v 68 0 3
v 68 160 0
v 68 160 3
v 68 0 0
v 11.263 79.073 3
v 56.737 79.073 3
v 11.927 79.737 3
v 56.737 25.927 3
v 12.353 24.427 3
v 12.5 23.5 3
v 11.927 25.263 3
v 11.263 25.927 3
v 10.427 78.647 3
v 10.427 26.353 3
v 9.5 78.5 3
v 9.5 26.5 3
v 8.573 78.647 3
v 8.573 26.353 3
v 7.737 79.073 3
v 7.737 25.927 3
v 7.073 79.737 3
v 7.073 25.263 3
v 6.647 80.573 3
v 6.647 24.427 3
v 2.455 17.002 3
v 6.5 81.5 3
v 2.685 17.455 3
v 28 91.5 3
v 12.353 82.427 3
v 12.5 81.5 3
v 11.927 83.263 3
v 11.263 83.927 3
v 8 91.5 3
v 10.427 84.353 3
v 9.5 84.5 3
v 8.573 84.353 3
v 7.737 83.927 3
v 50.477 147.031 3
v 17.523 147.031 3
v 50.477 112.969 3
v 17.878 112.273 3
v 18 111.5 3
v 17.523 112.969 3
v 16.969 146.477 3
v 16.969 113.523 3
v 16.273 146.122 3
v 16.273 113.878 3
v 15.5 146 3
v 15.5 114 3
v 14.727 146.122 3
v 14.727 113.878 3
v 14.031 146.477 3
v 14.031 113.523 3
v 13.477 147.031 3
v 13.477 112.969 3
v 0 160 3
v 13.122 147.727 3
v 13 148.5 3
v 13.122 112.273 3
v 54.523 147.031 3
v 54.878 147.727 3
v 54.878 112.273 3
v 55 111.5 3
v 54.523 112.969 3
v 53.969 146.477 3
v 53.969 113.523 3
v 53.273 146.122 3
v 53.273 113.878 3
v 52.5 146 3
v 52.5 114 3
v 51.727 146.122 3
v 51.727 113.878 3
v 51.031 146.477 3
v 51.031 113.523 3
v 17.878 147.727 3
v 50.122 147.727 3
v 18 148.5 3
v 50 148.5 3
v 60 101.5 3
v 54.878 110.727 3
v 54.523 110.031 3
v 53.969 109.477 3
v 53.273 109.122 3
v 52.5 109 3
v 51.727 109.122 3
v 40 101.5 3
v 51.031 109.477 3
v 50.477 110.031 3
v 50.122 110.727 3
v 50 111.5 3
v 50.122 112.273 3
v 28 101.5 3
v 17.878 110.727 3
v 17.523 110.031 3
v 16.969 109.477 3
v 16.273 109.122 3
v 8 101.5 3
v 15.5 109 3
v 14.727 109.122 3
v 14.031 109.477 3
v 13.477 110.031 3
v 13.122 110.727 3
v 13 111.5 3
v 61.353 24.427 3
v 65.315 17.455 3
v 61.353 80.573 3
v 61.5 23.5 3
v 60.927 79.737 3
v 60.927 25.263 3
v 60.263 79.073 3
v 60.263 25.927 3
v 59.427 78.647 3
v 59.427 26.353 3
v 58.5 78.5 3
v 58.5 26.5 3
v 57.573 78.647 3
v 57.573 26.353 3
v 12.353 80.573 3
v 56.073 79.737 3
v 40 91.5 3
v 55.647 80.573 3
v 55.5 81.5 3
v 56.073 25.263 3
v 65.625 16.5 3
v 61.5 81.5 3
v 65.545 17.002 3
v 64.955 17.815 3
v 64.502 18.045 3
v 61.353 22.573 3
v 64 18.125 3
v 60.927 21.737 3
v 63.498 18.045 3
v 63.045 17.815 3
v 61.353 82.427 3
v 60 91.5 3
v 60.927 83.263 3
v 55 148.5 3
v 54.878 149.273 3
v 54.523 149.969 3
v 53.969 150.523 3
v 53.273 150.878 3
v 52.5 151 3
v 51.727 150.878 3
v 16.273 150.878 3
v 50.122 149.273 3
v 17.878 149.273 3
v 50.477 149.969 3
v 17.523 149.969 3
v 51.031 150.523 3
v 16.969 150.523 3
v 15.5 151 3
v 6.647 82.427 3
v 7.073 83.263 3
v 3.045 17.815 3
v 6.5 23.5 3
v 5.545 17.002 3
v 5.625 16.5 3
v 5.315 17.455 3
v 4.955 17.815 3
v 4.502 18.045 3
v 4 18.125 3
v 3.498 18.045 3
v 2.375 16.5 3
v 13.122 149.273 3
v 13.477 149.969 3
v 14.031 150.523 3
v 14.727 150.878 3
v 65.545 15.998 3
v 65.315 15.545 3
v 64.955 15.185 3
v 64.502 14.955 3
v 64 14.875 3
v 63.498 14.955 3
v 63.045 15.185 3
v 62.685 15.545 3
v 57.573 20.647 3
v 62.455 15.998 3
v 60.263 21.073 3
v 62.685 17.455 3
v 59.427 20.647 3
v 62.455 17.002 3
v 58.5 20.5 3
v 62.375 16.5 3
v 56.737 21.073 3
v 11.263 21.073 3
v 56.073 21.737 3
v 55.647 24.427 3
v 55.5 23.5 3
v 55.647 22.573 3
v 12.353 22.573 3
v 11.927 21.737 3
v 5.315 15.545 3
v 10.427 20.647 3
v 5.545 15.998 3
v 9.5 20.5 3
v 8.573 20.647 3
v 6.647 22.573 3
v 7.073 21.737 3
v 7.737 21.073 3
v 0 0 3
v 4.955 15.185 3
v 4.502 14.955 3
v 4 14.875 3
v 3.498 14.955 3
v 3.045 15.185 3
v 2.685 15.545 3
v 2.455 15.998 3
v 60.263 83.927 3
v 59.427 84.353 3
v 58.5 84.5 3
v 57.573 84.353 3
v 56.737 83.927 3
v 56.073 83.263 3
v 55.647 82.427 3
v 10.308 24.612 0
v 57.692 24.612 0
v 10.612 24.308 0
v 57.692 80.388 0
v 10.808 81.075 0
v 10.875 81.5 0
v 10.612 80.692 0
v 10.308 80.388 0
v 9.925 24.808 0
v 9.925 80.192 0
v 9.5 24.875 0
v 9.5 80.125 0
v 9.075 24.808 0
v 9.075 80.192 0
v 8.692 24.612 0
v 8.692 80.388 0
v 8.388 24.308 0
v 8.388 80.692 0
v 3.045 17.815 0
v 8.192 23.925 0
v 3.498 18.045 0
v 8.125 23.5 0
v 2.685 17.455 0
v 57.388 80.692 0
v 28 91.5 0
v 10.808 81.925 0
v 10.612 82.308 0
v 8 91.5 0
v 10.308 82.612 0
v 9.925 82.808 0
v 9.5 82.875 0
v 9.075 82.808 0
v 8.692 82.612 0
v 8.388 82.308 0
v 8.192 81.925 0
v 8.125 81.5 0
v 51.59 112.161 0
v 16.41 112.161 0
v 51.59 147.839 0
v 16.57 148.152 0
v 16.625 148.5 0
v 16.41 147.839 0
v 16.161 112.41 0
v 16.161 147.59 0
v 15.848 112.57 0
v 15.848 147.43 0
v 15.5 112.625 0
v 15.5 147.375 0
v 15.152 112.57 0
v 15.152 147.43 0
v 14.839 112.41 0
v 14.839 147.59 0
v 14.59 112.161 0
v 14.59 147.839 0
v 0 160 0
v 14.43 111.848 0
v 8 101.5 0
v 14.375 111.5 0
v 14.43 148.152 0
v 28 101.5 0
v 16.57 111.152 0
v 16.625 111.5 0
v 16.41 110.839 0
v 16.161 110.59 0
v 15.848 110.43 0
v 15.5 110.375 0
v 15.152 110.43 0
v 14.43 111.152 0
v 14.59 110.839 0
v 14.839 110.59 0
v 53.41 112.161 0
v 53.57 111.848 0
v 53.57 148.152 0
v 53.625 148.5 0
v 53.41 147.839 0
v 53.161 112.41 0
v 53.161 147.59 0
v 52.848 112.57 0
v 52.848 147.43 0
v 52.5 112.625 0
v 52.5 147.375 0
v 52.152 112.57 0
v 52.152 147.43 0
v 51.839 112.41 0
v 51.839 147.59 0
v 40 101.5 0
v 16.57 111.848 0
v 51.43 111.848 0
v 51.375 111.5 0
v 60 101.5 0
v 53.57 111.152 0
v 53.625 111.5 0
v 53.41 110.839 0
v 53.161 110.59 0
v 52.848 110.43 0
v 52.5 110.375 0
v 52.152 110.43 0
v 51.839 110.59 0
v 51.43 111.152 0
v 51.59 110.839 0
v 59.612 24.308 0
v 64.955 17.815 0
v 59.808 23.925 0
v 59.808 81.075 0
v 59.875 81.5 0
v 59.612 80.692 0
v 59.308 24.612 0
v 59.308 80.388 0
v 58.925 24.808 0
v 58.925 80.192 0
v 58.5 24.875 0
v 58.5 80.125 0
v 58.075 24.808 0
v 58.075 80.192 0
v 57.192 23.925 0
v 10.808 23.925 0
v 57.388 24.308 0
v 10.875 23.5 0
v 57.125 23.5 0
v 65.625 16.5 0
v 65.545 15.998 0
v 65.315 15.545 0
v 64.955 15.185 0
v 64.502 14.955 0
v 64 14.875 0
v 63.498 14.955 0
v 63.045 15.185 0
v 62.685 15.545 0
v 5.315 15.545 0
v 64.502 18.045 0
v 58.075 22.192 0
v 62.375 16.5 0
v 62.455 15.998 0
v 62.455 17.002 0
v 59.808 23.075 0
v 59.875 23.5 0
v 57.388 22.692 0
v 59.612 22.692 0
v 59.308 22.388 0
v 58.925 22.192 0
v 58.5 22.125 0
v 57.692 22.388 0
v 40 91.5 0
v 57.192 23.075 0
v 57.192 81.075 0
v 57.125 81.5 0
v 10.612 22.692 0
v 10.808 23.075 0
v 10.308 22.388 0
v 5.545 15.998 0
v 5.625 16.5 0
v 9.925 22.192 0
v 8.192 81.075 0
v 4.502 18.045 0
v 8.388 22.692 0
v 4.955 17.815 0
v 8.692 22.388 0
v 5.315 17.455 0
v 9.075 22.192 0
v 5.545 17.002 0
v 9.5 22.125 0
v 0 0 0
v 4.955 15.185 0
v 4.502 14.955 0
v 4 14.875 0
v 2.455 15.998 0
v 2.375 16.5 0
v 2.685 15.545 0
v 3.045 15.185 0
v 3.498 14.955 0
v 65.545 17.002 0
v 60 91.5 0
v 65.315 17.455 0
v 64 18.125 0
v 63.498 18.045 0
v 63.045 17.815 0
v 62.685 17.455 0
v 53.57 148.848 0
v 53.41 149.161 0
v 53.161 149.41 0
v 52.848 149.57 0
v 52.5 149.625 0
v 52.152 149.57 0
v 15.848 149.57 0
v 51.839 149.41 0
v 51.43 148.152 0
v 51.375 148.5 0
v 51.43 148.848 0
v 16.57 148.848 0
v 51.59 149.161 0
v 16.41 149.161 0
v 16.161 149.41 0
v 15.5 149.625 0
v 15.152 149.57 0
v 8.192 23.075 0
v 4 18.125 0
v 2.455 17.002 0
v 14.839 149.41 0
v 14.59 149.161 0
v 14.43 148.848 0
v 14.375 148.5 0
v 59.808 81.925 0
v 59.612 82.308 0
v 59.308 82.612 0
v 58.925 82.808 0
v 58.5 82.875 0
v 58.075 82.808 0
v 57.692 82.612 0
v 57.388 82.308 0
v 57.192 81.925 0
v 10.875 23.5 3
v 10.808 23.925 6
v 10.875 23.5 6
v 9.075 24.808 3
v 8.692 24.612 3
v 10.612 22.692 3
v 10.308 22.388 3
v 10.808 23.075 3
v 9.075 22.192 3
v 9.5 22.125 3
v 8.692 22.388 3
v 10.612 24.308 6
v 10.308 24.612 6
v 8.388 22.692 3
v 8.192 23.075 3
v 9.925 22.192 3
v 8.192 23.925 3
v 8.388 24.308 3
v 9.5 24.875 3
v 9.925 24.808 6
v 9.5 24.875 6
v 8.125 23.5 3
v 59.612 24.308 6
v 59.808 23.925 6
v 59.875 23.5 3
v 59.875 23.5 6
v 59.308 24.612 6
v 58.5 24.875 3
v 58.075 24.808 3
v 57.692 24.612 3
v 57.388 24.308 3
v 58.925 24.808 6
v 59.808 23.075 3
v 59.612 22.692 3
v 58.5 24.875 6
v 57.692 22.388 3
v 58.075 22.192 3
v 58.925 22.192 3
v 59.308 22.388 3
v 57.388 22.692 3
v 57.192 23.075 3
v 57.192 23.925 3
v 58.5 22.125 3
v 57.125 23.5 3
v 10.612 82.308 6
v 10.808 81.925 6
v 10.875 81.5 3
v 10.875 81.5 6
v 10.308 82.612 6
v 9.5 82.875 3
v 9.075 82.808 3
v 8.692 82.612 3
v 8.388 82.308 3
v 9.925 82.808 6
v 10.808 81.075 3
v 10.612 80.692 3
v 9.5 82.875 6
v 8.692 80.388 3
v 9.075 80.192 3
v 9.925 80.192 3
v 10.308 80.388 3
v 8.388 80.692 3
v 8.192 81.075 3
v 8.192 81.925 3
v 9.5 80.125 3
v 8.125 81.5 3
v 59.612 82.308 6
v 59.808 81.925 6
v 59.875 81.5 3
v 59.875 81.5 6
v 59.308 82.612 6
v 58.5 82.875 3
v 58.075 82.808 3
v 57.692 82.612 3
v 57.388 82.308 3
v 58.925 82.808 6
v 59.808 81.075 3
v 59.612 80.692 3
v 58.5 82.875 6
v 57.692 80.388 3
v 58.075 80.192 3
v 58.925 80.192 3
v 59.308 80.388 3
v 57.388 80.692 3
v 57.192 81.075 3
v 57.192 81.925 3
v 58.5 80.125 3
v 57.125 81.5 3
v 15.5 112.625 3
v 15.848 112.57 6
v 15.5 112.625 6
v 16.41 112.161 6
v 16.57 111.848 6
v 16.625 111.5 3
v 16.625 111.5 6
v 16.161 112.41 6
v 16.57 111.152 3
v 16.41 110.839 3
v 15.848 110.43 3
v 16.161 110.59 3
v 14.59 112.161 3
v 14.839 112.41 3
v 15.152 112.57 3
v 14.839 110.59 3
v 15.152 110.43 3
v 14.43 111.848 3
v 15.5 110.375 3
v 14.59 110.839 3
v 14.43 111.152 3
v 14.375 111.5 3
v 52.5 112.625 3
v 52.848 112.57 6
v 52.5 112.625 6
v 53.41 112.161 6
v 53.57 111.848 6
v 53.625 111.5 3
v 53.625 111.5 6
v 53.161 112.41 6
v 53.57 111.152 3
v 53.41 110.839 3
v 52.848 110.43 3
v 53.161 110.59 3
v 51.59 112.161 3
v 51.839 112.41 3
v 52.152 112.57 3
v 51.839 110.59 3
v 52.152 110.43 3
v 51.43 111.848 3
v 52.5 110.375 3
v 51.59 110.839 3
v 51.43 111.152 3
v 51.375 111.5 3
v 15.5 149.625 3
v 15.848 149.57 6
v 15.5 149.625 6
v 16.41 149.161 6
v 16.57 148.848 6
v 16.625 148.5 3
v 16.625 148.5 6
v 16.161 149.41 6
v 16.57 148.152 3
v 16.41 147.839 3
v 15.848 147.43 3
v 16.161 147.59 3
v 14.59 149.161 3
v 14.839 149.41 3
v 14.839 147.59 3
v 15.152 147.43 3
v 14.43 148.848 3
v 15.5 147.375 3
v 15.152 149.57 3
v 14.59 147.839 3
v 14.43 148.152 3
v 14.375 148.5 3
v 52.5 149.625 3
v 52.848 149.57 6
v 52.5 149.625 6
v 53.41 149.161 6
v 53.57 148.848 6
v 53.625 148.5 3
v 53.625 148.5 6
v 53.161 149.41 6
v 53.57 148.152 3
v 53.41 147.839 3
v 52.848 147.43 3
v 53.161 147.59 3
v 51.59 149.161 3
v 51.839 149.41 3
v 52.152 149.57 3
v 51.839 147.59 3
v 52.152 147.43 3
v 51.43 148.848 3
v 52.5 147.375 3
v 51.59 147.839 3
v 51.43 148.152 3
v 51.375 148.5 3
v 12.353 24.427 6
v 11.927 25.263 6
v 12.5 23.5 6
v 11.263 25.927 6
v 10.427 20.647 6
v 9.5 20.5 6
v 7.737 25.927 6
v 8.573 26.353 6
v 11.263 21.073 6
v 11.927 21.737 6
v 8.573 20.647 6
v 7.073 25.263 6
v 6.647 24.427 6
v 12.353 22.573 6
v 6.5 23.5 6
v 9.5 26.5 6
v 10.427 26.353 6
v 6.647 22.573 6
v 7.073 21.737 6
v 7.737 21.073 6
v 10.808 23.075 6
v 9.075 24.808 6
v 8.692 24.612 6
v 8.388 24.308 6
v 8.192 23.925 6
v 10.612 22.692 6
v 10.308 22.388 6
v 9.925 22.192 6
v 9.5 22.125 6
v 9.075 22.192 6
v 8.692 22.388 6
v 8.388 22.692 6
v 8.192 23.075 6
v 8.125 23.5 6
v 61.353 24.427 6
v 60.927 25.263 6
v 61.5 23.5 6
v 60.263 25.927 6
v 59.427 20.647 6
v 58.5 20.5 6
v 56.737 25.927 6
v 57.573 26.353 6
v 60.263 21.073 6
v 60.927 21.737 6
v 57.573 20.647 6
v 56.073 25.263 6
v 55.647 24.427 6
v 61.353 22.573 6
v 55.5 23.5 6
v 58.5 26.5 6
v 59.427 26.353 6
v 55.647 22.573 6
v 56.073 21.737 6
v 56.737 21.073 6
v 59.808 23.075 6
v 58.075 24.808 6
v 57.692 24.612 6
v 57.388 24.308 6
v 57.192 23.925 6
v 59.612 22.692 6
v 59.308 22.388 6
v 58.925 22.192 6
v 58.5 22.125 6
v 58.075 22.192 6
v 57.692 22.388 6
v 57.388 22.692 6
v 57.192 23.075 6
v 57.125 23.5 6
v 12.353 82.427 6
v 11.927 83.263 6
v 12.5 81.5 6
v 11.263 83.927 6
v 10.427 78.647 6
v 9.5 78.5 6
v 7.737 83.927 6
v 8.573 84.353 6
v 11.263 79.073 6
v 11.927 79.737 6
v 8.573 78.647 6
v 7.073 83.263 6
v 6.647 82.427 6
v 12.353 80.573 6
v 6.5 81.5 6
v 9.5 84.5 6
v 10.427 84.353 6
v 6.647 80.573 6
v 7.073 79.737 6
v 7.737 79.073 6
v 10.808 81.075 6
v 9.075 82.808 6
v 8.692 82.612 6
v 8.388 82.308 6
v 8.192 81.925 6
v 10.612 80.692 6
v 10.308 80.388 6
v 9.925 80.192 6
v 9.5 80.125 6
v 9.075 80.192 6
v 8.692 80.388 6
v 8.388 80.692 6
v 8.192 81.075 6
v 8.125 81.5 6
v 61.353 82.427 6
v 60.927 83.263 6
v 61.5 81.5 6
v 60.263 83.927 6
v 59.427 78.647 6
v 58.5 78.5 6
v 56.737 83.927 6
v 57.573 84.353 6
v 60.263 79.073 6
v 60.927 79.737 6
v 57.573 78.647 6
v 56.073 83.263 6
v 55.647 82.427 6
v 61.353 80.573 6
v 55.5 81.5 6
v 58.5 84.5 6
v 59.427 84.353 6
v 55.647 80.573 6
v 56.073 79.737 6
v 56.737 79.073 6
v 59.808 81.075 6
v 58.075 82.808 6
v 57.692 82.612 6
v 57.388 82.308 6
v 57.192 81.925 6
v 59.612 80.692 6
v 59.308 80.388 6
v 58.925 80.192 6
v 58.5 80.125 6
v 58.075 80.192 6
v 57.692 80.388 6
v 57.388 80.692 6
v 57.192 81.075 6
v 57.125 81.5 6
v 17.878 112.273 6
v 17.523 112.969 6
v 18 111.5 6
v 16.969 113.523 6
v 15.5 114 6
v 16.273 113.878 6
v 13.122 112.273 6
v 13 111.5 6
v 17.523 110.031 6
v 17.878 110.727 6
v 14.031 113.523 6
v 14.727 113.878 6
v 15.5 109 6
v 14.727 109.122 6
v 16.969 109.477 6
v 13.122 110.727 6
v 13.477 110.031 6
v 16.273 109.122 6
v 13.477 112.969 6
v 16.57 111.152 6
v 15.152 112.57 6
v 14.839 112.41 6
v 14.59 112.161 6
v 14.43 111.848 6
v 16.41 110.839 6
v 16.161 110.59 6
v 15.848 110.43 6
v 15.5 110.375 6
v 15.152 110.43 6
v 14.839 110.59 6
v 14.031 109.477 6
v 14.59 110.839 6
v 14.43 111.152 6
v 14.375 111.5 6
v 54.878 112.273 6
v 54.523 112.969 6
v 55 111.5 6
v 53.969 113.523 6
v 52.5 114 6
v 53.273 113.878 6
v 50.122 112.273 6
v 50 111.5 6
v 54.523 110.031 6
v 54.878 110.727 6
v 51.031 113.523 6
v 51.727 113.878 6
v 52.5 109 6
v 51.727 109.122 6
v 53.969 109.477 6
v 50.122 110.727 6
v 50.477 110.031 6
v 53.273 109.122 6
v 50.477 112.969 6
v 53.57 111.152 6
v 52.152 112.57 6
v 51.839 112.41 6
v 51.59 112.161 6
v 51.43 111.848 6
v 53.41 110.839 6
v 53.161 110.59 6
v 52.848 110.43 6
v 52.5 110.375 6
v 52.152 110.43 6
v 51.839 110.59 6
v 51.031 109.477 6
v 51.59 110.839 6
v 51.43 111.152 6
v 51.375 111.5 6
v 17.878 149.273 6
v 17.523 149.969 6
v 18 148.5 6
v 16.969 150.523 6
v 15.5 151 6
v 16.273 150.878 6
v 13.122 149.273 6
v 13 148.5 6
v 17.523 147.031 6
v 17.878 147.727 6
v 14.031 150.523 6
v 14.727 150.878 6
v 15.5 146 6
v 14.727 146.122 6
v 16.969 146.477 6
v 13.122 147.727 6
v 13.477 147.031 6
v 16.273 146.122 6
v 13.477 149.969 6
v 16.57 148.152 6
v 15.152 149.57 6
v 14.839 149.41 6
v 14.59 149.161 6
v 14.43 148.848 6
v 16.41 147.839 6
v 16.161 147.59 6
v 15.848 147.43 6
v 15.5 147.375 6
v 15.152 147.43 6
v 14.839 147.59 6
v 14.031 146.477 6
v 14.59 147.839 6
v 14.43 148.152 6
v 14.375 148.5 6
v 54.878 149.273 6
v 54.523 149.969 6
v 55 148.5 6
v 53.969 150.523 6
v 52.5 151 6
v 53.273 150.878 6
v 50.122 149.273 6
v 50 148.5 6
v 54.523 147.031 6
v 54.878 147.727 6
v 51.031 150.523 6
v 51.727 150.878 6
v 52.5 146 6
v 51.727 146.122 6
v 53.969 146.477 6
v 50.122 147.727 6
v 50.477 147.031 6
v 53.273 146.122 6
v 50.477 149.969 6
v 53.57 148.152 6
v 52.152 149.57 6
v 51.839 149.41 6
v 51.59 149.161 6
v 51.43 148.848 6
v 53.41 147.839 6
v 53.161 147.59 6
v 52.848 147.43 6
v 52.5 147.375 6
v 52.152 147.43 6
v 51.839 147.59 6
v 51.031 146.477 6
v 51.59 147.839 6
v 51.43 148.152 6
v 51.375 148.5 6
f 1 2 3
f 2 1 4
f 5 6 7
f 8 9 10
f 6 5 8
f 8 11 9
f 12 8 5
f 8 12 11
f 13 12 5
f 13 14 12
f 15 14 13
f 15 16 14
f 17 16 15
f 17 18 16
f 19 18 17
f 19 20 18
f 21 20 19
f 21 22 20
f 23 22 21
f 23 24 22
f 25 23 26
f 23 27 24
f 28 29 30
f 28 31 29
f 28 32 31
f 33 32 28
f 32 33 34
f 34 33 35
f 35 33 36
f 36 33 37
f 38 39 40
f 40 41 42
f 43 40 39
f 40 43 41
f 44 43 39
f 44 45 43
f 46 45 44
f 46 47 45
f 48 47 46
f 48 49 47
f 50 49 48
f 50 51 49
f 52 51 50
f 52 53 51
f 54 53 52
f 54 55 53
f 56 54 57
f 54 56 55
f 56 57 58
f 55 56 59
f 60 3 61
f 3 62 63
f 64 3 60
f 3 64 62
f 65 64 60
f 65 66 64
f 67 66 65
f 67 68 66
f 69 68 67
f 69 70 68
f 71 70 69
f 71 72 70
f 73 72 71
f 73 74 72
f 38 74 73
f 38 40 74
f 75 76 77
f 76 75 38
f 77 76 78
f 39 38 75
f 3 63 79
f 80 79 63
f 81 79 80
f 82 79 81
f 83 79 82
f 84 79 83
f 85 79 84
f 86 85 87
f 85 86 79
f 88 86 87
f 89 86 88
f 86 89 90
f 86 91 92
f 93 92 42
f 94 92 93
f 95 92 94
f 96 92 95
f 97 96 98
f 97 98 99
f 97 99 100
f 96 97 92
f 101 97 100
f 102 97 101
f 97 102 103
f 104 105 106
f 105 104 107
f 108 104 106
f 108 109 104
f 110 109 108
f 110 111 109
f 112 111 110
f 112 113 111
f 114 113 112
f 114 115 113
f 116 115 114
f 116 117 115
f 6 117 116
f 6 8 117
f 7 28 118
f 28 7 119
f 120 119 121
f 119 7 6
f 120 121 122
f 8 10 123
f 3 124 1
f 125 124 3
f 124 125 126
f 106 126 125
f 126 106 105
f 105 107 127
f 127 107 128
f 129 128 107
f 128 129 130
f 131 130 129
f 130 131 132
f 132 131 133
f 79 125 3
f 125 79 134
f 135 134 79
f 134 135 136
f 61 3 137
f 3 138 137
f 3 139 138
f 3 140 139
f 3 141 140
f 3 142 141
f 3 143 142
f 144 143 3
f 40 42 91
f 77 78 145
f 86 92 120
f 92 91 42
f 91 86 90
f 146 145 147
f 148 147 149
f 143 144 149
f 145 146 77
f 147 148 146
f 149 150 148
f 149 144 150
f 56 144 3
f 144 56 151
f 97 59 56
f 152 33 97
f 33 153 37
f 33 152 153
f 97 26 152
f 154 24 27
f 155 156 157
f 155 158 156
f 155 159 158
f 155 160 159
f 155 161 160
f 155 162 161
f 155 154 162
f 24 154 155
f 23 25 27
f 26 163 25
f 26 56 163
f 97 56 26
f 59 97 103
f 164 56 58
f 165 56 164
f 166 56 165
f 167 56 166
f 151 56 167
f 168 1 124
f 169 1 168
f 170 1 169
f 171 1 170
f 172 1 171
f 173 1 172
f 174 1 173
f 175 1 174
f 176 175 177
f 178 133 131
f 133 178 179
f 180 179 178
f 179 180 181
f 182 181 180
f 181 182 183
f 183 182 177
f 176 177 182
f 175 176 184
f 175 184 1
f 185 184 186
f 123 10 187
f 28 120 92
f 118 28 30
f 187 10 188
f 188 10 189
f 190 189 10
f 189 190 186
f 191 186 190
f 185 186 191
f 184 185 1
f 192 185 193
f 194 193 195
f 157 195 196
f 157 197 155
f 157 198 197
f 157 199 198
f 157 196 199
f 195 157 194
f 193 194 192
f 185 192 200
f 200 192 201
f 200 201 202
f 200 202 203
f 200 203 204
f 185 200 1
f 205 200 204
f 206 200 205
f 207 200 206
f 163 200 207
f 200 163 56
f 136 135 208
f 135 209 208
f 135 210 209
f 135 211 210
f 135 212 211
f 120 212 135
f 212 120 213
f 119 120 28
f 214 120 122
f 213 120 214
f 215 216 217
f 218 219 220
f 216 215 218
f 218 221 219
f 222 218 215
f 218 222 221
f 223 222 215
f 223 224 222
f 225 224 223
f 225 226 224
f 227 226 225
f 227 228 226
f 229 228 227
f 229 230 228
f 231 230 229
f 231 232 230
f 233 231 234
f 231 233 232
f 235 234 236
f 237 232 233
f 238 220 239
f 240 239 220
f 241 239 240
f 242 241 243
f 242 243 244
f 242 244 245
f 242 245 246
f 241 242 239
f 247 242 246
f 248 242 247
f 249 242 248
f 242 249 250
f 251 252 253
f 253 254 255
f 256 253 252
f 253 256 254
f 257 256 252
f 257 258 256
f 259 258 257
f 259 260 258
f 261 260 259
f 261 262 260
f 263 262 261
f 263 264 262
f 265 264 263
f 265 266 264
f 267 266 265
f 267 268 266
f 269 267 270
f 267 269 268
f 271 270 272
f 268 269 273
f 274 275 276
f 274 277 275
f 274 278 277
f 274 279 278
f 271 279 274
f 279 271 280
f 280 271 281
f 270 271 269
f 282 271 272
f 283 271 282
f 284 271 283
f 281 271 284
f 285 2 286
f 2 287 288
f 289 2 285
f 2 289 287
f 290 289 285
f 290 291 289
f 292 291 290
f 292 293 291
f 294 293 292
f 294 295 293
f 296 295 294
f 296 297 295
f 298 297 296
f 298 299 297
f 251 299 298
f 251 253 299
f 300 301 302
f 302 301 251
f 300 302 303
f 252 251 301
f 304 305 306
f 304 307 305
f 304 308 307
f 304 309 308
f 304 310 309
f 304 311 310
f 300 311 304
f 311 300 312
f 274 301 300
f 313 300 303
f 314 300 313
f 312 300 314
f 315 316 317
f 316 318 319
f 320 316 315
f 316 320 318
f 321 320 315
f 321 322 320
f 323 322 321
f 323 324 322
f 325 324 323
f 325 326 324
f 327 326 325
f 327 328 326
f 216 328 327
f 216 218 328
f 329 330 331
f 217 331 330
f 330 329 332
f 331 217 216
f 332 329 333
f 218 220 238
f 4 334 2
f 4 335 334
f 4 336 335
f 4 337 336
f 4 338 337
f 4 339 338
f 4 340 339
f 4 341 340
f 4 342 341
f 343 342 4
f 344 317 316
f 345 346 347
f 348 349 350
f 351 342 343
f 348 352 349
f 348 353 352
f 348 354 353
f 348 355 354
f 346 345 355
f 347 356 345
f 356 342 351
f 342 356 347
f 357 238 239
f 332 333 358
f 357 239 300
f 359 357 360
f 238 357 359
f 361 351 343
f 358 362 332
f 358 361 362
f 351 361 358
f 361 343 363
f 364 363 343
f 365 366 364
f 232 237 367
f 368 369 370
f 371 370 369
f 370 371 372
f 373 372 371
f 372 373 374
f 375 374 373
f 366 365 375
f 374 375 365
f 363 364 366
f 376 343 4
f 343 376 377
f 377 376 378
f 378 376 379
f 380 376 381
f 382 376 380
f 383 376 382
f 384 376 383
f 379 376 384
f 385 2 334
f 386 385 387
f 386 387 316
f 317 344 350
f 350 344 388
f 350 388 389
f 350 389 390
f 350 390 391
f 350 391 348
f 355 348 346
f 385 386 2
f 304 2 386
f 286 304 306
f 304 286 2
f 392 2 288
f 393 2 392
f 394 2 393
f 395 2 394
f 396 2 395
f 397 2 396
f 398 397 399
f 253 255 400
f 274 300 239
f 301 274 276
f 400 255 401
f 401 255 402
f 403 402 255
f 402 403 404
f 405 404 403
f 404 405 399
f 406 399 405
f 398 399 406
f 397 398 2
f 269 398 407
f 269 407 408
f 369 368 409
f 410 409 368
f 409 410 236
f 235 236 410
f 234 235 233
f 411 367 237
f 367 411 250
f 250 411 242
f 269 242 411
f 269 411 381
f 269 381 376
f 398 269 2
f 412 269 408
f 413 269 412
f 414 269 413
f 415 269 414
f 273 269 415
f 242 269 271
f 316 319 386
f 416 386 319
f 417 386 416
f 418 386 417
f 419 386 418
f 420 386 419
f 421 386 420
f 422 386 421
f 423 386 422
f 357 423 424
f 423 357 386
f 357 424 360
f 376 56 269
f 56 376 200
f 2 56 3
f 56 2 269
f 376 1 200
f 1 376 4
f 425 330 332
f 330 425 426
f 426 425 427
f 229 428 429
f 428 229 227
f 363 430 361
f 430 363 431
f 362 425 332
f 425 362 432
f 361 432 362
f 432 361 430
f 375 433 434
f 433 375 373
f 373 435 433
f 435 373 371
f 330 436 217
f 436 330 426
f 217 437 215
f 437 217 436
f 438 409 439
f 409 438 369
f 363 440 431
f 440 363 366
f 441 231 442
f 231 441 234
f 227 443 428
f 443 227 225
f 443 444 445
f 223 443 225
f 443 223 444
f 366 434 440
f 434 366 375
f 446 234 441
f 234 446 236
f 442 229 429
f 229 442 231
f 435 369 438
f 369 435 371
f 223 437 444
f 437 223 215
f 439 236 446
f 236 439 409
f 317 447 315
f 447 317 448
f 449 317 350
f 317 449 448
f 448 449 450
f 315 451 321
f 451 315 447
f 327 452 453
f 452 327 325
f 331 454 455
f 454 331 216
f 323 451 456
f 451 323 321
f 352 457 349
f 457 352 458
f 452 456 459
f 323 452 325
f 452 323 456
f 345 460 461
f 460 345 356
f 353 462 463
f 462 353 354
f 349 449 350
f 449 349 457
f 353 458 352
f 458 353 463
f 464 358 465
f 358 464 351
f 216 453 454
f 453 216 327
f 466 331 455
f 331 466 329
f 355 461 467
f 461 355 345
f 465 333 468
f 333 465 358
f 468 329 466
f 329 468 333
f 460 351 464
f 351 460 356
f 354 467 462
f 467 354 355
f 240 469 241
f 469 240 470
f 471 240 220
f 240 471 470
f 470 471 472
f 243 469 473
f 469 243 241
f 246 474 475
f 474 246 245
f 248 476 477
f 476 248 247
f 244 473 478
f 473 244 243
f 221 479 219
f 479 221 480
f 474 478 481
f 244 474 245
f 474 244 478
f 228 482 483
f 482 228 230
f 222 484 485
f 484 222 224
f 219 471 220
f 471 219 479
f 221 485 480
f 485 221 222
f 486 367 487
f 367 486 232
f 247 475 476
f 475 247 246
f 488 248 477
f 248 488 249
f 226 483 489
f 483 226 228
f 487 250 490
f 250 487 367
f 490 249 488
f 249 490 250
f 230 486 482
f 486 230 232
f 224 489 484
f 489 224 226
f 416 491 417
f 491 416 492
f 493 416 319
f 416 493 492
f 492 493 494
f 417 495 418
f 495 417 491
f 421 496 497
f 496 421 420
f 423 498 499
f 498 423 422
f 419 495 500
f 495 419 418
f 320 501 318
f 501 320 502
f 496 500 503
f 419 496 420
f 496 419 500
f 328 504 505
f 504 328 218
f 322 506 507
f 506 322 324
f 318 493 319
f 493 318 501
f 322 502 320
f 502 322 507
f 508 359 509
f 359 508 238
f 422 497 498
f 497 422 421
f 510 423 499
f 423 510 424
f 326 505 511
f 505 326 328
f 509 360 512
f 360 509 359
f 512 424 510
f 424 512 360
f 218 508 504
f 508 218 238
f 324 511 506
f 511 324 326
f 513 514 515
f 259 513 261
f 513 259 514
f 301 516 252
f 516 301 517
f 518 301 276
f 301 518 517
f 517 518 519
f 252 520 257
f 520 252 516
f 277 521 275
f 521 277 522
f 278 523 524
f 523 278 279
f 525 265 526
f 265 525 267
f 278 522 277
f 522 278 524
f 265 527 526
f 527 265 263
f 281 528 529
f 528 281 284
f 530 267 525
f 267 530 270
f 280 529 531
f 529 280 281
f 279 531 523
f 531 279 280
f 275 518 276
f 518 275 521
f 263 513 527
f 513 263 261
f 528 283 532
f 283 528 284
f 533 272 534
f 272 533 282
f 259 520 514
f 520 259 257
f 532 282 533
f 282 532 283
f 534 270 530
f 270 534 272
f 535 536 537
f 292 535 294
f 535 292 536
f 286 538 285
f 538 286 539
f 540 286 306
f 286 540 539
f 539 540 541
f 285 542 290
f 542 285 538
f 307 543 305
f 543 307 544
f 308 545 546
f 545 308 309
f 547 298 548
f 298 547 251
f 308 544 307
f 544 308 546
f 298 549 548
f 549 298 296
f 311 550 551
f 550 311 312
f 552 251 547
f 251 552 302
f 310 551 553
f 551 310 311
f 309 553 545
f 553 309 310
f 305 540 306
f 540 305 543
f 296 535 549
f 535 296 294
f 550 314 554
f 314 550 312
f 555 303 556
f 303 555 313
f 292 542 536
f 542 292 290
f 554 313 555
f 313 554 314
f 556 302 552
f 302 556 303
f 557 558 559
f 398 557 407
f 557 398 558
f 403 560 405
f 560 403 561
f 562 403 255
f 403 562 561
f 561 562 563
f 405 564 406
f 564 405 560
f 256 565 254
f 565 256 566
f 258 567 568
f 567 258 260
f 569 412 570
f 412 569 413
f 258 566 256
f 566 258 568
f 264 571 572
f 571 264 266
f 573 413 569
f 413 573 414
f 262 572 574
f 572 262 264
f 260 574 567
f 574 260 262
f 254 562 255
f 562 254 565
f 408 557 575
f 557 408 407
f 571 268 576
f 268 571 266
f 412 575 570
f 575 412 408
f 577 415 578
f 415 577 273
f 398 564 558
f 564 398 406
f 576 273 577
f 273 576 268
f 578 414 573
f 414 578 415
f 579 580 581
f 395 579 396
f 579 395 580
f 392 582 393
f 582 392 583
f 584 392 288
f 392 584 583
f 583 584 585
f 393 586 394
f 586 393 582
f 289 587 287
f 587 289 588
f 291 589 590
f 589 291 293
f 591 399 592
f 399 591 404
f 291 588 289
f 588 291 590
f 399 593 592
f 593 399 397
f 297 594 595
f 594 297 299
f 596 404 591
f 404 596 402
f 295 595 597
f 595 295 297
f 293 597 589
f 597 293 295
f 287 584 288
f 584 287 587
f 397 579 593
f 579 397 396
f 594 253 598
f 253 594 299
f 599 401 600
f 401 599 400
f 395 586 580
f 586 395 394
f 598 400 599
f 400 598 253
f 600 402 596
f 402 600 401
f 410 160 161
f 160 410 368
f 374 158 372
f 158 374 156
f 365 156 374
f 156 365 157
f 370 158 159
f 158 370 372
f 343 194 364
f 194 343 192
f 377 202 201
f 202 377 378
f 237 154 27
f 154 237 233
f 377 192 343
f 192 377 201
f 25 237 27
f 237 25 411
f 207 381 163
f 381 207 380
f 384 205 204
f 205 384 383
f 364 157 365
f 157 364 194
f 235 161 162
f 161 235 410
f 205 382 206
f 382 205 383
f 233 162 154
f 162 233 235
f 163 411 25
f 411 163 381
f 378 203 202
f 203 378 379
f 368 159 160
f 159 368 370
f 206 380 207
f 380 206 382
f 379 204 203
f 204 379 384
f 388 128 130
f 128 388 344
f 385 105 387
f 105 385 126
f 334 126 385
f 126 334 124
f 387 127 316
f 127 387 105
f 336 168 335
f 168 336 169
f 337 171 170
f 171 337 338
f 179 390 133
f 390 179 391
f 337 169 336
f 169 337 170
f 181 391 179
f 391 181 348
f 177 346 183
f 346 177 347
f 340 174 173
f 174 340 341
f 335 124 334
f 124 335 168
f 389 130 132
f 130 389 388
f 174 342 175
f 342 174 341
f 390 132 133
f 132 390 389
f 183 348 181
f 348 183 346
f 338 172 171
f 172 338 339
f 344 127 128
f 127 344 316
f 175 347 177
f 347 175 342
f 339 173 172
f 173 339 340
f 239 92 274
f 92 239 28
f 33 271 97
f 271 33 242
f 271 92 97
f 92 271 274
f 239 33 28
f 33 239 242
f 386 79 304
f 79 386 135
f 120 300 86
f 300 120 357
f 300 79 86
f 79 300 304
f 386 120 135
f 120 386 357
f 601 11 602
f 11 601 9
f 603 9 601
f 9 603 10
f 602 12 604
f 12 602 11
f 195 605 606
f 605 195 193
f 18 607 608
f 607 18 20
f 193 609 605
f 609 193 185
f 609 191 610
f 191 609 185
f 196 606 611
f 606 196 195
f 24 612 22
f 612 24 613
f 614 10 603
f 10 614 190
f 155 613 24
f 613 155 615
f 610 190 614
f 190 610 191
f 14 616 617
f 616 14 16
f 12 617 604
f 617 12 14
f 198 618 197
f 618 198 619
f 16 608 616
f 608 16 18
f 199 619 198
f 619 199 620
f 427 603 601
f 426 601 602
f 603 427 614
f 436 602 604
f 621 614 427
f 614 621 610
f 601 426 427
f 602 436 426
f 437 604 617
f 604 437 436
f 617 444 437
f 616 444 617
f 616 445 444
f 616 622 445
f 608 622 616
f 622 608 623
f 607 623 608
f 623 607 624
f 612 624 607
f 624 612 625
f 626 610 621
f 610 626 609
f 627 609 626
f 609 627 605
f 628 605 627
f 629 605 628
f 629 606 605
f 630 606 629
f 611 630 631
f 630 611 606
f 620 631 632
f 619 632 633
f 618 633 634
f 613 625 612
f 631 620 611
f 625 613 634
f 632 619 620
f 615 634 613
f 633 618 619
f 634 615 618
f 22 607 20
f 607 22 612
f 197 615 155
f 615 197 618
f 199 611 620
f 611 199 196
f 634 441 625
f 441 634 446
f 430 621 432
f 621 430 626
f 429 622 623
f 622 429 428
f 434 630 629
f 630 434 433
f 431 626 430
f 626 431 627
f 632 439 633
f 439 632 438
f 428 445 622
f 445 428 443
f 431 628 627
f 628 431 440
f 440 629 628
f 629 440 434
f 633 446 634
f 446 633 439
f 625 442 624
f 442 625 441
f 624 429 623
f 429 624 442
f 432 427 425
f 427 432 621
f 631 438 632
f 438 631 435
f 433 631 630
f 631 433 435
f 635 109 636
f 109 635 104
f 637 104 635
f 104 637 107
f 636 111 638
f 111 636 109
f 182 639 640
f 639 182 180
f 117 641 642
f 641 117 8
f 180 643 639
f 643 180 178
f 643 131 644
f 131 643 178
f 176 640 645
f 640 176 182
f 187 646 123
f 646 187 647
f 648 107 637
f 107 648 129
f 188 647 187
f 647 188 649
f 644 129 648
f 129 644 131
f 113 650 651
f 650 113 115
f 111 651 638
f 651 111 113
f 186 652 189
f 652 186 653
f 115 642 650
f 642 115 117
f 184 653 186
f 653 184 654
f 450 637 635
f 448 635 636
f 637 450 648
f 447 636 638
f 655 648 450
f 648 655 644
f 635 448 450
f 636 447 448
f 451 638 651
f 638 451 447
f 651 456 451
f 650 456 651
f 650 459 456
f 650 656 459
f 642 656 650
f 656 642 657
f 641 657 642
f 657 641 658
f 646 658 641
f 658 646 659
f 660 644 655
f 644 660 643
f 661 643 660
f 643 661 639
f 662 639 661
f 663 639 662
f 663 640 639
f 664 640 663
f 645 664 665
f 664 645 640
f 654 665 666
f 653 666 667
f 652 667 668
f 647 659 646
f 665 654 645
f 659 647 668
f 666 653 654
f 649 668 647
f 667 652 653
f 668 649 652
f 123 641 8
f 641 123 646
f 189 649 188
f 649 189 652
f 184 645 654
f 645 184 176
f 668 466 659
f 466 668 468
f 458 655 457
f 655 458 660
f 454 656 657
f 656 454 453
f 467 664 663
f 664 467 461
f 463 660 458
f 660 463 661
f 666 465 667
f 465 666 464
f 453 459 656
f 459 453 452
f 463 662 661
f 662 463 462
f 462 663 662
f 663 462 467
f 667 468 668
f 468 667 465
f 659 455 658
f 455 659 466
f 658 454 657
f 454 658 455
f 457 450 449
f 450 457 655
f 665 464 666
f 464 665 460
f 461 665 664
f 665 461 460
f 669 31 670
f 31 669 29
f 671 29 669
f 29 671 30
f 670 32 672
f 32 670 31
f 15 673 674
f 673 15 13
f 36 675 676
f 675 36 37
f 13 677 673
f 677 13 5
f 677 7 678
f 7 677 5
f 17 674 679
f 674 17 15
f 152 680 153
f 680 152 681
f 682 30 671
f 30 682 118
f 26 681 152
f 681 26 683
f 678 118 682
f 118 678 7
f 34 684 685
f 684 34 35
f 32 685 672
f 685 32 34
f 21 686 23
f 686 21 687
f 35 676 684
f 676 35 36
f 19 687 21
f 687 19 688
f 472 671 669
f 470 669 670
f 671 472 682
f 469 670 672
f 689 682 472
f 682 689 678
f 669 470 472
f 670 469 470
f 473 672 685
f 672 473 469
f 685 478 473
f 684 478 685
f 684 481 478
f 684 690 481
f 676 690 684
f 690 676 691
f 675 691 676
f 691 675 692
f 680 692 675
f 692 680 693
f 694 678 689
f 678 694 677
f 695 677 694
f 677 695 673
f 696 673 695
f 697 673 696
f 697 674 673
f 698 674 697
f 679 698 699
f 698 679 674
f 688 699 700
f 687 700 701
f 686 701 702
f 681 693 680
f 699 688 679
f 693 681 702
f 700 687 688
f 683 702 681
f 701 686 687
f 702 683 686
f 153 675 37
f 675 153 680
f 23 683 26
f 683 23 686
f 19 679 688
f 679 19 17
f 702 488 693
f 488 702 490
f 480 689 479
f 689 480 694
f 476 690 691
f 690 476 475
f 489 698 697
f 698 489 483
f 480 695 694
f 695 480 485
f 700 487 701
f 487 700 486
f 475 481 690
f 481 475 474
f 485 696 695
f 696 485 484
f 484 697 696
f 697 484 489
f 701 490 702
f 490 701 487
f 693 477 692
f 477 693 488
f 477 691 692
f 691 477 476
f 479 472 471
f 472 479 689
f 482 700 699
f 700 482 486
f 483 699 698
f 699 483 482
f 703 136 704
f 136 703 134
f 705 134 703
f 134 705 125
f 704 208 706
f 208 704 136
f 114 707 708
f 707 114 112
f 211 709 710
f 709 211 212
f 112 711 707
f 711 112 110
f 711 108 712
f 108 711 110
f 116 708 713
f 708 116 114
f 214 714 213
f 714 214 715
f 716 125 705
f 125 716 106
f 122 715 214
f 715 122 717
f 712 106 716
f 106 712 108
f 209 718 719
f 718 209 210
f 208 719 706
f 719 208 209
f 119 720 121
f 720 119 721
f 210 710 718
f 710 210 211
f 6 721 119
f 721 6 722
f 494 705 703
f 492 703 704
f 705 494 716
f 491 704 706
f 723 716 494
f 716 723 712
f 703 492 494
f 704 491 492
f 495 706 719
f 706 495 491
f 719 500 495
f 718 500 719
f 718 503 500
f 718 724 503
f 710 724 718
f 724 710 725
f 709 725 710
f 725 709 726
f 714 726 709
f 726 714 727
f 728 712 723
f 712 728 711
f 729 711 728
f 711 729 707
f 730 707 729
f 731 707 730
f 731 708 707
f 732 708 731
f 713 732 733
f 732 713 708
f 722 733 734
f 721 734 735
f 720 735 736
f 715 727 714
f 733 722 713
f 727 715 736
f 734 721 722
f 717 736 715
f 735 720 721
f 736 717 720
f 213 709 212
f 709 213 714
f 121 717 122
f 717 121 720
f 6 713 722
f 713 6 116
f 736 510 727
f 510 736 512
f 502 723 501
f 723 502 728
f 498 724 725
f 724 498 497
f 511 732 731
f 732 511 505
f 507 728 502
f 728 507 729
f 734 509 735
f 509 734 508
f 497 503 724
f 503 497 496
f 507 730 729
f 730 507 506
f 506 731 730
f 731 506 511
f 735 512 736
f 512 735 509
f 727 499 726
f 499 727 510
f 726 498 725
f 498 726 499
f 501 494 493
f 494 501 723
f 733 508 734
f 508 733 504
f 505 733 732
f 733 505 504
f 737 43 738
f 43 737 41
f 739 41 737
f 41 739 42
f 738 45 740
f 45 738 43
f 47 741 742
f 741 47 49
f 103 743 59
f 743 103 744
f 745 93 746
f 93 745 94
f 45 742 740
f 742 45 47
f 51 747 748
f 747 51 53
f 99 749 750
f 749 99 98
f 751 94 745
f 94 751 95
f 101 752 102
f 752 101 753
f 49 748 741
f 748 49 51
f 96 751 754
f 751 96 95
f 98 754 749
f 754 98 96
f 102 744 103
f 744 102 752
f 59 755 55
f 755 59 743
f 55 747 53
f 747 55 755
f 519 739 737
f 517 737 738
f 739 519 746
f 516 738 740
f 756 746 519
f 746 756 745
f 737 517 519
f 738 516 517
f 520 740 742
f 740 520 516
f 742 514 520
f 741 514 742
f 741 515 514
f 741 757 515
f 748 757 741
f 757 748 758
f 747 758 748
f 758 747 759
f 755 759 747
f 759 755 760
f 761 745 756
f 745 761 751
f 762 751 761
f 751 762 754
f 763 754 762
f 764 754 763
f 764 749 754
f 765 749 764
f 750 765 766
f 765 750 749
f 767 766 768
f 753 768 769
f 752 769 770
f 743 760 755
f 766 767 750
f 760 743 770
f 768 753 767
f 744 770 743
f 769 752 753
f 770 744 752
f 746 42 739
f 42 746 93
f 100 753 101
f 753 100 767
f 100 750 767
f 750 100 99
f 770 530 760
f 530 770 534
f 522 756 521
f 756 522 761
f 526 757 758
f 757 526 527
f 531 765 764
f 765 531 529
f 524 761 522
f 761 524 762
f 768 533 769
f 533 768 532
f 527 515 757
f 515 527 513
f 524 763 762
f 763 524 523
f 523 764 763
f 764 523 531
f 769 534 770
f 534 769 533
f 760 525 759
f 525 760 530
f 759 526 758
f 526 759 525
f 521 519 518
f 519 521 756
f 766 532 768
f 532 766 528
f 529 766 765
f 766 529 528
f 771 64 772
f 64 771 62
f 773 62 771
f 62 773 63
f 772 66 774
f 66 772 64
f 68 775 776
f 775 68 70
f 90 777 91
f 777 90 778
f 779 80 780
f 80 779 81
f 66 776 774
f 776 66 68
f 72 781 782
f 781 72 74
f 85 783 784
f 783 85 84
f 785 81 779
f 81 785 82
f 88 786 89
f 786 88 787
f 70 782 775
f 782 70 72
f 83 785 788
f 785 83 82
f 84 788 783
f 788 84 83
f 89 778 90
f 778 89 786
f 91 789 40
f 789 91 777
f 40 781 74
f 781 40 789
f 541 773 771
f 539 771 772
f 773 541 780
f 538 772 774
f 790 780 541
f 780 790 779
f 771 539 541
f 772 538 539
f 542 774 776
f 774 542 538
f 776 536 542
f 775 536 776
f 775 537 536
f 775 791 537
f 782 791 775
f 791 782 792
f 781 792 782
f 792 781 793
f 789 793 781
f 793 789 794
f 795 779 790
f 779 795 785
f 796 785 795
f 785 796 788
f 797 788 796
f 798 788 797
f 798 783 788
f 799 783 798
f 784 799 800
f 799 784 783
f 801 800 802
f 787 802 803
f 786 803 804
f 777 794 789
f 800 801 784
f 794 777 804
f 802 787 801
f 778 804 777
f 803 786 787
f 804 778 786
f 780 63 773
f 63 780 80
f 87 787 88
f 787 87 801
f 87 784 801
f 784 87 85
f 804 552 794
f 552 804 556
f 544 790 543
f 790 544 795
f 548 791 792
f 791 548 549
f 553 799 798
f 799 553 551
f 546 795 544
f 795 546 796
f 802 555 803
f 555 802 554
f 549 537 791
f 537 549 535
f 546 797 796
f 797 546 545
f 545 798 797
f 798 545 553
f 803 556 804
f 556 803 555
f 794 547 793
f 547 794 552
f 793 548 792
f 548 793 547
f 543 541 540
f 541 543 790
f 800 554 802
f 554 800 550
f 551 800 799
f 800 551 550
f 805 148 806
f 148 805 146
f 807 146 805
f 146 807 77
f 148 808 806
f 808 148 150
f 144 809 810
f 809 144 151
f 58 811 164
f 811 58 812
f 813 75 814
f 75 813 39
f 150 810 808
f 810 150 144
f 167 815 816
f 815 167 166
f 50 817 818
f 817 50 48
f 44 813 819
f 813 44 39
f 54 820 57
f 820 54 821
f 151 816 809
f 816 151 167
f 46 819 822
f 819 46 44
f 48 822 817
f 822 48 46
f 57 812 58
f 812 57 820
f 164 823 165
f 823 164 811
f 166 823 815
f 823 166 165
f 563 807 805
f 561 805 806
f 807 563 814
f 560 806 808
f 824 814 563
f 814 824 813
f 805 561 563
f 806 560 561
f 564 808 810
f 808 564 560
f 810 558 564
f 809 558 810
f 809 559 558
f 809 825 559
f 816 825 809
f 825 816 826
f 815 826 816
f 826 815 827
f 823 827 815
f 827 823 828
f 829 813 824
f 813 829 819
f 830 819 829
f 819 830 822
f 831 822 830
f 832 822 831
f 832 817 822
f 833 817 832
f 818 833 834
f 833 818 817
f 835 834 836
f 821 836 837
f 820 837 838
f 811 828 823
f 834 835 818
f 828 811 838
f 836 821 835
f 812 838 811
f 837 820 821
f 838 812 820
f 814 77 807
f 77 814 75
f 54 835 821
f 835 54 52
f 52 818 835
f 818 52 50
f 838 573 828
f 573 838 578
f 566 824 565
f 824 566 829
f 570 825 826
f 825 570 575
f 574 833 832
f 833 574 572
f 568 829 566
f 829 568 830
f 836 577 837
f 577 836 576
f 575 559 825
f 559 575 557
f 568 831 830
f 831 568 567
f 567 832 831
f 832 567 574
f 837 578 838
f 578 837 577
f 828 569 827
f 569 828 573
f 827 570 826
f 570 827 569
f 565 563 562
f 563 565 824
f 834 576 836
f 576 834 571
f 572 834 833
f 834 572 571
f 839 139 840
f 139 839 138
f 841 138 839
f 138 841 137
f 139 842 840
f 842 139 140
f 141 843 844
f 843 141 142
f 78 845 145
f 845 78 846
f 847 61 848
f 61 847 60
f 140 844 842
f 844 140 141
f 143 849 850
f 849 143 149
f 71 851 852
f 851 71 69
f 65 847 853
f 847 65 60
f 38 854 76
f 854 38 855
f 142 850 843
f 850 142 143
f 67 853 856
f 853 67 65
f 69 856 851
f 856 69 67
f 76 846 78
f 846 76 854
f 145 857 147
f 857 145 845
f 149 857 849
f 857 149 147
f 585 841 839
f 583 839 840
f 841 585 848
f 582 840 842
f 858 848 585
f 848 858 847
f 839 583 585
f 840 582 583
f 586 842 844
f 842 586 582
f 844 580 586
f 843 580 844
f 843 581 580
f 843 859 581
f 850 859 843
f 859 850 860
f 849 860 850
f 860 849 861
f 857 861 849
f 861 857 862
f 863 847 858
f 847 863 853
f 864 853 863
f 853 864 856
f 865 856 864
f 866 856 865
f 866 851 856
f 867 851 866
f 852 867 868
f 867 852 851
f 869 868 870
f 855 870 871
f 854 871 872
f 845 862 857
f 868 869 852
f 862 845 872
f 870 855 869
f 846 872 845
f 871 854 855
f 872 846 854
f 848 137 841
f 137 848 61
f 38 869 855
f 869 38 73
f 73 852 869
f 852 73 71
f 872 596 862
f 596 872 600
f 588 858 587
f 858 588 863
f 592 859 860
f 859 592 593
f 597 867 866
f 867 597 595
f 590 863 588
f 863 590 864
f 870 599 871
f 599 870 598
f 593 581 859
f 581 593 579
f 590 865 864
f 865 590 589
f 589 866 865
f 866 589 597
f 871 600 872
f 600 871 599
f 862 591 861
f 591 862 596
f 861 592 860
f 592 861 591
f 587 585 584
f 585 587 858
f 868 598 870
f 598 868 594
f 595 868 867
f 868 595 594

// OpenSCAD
bot_length = 160;
bot_width = 68;
default_elem_height = 3;


module m25_elevated_whole(xpos, ypos) {
    union() {
        translate([xpos, ypos, 3]) {
            difference() {
                cylinder(d = 6, h = default_elem_height, $fn=20);                
                translate([0,0,-1]) cylinder(d = 2.75, h = default_elem_height + 1.1, $fn=20);
            }
        }
    }
}

module m20_elevated_hole(xpos, ypos) {    
    union() {
        translate([xpos, ypos, 3]) {
            difference() {
                cylinder(d = 5, h = default_elem_height, $fn=20);                
                translate([0,0,-1]) cylinder(d = 2.25, h = default_elem_height + 1.1, $fn=20);
            }
        }
    }
}

module base_plate() {
    //Abstand der Bohrungen des RPI in mm.
    raspi_width = 49;
    rasp_length = 58;
    
    //Abstand auf der y-Achse der Bohrungen des RPi.
    y_offset = (bot_width - raspi_width) / 2;
    //Positionen der einzelnen Bohrungen für den RPi.
    rpi_pos = [
        [y_offset, 23.5],
        [bot_width - y_offset, 23.5],
        [y_offset, 23.5 + rasp_length],
        [bot_width - y_offset, 23.5 + rasp_length]];
    
    //Abstand der Bohrungen auf dem L298N. Die Bohrungen ergeben als Form ein Quadrat.
    l298n_len = 37;
    l298n_y_offset = (bot_width - l298n_len) / 2;
    l298n_pos = [
        [l298n_y_offset, rasp_length + 23.5 + 30],
        [bot_width - l298n_y_offset, rasp_length + 23.5 + 30],
        [l298n_y_offset, rasp_length + 23.5 + 30 + l298n_len],
        [bot_width - l298n_y_offset, rasp_length + 23.5 + 30 + + l298n_len]];
    
    //Abstand der Bohrungen auf dem Motorblock zu einander.
    gears_width = 60;
    gears_y_offset = (bot_width - gears_width) / 2;
    
    difference() {
        cube([bot_width, bot_length, default_elem_height]);
        
        //Bohrungen für den RPaspberry.
        translate([rpi_pos[0][0], rpi_pos[0][1],-5]) 
            cylinder(d = 2.75, h = default_elem_height + 13, $fn=20);
        translate([rpi_pos[1][0], rpi_pos[1][1],-5]) 
            cylinder(d = 2.75, h = default_elem_height + 13, $fn=20);
        translate([rpi_pos[2][0], rpi_pos[2][1],-5]) 
            cylinder(d = 2.75, h = default_elem_height + 13, $fn=20);
        translate([rpi_pos[3][0], rpi_pos[3][1],-5]) 
            cylinder(d = 2.75, h = default_elem_height + 13, $fn=20);
        
        //Bohrungen für den L298N.
        translate([l298n_pos[0][0], l298n_pos[0][1],-5]) 
            cylinder(d = 2.25, h = default_elem_height + 13, $fn=20);
        translate([l298n_pos[1][0], l298n_pos[1][1],-5]) 
            cylinder(d = 2.25, h = default_elem_height + 13, $fn=20);
        translate([l298n_pos[2][0], l298n_pos[2][1],-5]) 
            cylinder(d = 2.25, h = default_elem_height + 13, $fn=20);
        translate([l298n_pos[3][0], l298n_pos[3][1],-5]) 
            cylinder(d = 2.25, h = default_elem_height + 13, $fn=20);
        
        //Bohrungen für die Motoren samt Betriebe.
        translate([gears_y_offset, 16.5,-5]) 
            cylinder(d = 3.25, h = default_elem_height + 13, $fn=20);
        translate([bot_width - gears_y_offset, 16.5,-5])     
            cylinder(d = 3.25, h = default_elem_height + 13, $fn=20);
        
        //Aussparungen für die Kabelführung durch die Bodenplatte.
        translate([8, rpi_pos[3][1] + 10, -0.1])
            cube([20, 10, 11]);
        translate([bot_width - 20 - 8, rpi_pos[3][1] + 10, -0.1])
            cube([20, 10, 11]);
        
    };
    // Sockel für den Raspberry-PI.
    for (pos = rpi_pos) {
        m25_elevated_whole(pos[0], pos[1]);
    }
    
    // Sockel für den L298N.
    for (pos = l298n_pos) {
        m20_elevated_hole(pos[0], pos[1]);
    }    
}


base_plate();
